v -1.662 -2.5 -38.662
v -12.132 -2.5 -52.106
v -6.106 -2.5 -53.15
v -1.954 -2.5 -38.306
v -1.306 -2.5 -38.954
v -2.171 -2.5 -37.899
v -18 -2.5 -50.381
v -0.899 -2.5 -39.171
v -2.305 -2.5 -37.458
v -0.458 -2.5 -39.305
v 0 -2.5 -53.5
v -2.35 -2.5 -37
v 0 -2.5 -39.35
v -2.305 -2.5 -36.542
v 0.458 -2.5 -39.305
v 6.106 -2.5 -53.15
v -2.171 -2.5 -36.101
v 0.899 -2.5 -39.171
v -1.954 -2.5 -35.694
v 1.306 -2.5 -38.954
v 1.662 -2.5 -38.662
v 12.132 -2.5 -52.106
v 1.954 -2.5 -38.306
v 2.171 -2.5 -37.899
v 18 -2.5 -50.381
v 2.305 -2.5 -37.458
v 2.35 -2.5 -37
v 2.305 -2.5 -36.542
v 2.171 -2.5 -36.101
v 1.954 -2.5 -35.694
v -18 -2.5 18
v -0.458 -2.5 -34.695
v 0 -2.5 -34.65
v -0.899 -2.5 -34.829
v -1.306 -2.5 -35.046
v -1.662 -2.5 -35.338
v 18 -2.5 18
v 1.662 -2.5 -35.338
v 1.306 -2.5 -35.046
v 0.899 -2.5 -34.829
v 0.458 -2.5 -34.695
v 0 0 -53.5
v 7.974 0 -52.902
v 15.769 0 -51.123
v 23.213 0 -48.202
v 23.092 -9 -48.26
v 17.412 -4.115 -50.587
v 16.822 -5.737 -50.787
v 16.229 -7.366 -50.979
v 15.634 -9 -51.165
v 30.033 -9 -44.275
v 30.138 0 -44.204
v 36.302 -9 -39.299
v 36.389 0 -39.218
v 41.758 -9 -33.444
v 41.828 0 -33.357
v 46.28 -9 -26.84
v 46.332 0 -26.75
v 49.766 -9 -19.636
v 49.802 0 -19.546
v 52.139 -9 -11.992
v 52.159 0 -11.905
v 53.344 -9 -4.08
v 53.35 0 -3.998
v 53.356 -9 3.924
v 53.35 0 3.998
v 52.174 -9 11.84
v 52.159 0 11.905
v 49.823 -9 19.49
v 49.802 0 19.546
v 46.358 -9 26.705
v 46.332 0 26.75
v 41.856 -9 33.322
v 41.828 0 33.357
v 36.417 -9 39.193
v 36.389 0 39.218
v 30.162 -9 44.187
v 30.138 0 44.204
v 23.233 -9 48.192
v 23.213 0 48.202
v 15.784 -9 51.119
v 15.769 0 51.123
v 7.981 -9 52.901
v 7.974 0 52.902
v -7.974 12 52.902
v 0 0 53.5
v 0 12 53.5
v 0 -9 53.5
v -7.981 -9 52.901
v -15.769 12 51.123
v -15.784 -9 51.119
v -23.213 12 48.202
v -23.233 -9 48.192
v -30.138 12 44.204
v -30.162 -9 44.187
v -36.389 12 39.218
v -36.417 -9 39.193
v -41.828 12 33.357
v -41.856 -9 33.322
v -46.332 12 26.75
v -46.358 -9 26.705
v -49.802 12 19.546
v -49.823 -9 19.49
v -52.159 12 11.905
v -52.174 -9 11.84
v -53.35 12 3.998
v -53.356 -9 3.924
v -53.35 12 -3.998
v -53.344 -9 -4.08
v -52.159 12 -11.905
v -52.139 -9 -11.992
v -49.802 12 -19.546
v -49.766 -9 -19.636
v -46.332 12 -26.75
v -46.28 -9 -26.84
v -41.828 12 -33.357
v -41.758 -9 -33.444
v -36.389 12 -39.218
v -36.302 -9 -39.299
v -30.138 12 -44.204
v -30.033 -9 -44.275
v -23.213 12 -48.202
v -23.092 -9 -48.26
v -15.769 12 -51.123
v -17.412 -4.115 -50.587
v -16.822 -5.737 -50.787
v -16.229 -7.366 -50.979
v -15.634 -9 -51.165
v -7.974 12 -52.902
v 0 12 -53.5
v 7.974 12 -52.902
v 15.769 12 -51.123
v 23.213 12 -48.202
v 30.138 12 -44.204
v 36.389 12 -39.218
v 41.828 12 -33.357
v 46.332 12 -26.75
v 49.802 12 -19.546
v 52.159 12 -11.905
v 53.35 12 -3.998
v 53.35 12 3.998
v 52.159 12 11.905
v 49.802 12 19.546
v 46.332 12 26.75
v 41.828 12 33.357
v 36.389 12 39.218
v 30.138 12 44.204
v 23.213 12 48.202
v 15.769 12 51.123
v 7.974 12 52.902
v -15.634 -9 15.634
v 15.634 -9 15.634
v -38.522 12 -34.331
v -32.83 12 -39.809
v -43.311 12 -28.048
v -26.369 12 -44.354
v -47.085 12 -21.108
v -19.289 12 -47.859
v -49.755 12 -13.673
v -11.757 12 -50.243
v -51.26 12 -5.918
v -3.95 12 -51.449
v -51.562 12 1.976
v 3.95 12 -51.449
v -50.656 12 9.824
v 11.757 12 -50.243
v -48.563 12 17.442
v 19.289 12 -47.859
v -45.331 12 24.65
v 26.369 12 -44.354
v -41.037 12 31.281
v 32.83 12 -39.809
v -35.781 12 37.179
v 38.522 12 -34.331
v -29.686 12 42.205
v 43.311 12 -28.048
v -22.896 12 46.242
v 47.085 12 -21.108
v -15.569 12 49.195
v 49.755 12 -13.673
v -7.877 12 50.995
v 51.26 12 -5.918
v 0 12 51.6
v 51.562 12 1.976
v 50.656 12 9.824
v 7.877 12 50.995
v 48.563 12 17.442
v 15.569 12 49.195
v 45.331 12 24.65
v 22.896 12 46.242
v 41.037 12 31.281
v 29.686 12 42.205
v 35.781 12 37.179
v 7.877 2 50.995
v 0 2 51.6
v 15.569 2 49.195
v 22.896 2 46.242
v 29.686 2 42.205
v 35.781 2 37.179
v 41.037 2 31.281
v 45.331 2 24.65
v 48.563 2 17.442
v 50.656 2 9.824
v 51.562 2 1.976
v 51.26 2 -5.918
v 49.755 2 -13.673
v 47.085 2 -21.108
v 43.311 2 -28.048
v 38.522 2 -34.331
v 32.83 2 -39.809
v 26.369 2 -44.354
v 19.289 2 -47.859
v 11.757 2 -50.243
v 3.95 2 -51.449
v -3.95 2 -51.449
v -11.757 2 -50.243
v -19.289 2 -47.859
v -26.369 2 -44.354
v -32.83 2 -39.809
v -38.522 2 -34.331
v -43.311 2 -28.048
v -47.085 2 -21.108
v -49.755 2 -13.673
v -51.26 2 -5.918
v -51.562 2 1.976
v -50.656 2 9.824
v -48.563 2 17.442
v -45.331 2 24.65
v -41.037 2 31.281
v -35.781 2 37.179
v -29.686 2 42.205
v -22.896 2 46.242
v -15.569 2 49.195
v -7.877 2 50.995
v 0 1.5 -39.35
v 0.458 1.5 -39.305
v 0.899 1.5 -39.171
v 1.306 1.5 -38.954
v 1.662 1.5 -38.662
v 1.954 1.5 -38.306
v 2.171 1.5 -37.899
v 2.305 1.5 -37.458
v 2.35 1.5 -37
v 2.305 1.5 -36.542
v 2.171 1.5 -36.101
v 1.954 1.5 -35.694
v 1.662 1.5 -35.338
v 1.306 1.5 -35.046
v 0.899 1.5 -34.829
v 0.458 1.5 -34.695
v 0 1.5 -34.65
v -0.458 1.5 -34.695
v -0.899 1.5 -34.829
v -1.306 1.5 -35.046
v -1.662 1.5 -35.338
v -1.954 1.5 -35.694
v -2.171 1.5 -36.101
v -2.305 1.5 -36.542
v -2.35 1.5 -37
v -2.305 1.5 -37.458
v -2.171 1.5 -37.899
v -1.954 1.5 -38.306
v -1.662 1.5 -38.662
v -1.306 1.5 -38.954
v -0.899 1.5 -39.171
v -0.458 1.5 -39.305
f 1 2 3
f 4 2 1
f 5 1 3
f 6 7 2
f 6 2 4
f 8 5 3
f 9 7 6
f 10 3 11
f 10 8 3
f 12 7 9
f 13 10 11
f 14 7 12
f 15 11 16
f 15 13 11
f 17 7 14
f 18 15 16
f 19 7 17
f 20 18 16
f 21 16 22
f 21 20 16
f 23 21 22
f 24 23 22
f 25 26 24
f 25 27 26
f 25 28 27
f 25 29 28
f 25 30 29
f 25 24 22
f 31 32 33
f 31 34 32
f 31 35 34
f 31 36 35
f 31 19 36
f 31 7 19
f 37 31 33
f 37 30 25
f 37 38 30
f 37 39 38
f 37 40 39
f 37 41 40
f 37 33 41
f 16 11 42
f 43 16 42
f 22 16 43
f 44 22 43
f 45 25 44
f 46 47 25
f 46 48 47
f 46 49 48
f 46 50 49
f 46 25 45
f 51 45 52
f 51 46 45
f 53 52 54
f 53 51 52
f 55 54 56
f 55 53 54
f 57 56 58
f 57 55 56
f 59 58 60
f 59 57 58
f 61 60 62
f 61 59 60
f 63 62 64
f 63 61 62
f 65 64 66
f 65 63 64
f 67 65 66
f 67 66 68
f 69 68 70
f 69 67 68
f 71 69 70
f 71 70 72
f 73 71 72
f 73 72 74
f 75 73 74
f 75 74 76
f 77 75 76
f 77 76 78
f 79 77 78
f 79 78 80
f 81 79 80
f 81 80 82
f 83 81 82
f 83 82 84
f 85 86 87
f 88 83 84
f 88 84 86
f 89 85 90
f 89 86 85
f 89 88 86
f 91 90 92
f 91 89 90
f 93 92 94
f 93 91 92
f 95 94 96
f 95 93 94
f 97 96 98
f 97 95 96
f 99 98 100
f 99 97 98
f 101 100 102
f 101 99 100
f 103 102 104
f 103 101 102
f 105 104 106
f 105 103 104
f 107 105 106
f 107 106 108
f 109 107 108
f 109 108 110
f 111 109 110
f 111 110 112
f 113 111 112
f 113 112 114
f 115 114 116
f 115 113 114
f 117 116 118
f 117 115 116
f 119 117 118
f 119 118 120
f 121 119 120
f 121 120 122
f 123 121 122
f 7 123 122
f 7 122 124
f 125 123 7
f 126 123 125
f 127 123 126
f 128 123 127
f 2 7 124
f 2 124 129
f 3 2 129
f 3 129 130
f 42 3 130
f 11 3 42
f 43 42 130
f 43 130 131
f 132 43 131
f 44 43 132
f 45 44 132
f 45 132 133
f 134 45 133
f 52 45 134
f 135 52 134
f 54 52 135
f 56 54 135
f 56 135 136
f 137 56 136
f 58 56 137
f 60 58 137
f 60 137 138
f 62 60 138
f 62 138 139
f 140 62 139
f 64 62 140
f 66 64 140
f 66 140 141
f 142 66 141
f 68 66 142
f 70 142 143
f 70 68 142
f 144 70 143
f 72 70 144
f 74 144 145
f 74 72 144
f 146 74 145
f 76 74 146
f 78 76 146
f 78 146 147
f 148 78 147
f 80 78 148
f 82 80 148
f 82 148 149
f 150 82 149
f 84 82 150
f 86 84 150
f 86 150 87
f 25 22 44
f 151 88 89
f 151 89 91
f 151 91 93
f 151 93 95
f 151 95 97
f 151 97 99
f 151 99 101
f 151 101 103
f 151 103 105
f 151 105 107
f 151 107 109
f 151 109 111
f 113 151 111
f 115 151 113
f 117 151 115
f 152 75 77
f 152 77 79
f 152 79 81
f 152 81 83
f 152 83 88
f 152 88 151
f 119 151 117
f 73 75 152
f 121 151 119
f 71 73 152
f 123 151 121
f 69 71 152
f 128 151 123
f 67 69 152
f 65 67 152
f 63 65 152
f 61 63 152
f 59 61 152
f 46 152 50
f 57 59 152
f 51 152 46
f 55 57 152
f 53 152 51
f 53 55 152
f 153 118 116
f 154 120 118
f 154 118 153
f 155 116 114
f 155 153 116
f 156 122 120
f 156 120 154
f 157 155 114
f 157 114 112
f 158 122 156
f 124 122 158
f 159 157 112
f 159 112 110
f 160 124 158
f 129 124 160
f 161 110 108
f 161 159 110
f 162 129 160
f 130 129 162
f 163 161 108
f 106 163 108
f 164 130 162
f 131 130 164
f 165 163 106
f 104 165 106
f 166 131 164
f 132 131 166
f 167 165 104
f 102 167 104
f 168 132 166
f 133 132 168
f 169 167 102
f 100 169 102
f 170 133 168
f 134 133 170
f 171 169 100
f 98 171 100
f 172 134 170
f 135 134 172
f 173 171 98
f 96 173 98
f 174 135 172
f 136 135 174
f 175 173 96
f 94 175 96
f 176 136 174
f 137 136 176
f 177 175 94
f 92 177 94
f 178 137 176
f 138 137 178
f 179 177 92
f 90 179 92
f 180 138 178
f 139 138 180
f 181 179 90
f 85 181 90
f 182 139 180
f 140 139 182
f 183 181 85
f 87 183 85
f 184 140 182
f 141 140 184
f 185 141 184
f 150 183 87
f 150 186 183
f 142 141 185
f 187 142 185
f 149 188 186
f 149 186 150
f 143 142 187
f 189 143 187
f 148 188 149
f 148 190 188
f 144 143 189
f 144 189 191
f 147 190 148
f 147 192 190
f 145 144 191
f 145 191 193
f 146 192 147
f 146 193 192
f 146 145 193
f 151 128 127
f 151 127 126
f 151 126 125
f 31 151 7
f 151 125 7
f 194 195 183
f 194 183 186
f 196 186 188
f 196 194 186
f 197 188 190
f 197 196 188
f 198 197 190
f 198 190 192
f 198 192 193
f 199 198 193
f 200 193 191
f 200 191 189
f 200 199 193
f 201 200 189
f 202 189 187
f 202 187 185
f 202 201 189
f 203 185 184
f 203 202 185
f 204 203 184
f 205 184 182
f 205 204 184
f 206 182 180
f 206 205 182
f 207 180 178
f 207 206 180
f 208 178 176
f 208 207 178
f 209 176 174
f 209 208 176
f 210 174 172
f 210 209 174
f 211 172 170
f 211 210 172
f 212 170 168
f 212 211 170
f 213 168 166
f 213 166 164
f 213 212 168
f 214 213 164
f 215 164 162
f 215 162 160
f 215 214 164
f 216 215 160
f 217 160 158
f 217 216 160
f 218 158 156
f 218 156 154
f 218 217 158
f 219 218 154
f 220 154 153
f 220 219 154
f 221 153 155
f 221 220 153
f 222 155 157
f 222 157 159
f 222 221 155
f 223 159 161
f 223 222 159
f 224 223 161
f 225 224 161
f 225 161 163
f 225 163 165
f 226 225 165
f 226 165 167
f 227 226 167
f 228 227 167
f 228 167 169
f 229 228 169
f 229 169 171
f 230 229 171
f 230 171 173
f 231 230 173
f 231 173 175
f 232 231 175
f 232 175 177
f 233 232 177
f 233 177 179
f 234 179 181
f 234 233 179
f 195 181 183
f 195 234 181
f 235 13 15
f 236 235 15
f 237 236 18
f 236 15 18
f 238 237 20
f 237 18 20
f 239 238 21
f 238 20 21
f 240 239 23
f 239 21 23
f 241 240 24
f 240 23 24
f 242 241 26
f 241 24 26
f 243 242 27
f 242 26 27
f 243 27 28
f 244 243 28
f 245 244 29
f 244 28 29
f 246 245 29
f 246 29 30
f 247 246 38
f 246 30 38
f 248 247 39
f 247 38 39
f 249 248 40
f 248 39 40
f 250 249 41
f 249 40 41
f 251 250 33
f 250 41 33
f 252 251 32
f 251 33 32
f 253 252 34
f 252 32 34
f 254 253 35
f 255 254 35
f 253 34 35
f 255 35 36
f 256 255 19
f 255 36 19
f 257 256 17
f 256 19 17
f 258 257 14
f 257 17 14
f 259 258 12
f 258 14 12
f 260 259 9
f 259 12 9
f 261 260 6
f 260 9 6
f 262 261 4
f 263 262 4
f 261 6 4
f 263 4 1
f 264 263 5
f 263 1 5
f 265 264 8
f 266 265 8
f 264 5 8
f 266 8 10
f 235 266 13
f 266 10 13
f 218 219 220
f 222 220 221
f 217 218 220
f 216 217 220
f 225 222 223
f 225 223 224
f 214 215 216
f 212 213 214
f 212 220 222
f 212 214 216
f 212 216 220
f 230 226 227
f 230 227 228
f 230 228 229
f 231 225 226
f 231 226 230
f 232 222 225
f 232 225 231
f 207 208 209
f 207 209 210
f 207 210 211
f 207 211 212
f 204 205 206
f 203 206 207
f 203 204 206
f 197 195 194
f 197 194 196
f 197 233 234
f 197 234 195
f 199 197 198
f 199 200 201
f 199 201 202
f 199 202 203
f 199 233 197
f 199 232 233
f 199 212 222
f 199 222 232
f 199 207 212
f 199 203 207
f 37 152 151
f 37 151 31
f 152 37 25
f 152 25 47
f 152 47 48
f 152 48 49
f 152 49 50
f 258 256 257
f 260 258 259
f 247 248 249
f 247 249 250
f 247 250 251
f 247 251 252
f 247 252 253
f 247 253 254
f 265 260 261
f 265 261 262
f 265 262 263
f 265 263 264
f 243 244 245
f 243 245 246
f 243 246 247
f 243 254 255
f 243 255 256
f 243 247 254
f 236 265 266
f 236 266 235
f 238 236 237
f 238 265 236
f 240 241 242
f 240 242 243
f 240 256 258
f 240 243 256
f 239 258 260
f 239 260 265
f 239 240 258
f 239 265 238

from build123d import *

# Parameters (mm, degrees)
SKETCH1_R           = 53.5
BOSS_EXTRUDE1_DEPTH = 2
SKETCH2_R           = 53.5
SKETCH2_R_2         = 51.6
BOSS_EXTRUDE2_DEPTH = 10
BOSS_EXTRUDE3_START = 9
SKETCH4_R           = 53.5
BOSS_EXTRUDE3_DEPTH = 9
SKETCH6_W           = 36
SKETCH6_H           = 36
CUT_EXTRUDE1_DEPTH  = 6.5
DRAFT4_START        = -19
DRAFT4_DEPTH        = 37
DRAFT4_2_DEPTH      = 38
CUT_EXTRUDE2_DEPTH  = 40.5
SKETCH14_R          = 2.35
CUT_EXTRUDE3_DEPTH  = 4


with BuildPart() as part:
    # Sketch1 → Boss-Extrude1 (new body)
    with BuildSketch(Plane(origin=(0, 0, 0), x_dir=(1, 0, 0), z_dir=(0, 1, 0))):
        with Locations(Location((0, 0, 0), (0, 0, 270))):
            Circle(SKETCH1_R)
    extrude(amount=BOSS_EXTRUDE1_DEPTH)

    # Sketch2 → Boss-Extrude2 (add)
    with BuildSketch(Plane(origin=(0, 2, 0), x_dir=(1, 0, 0), z_dir=(0, 1, 0))):
        with Locations(Location((0, 0, 0), (0, 0, 270))):
            Circle(SKETCH2_R)
        with Locations(Location((0, 0, 0), (0, 0, 270))):
            Circle(SKETCH2_R_2, mode=Mode.SUBTRACT)
    extrude(amount=BOSS_EXTRUDE2_DEPTH)

    # Sketch4 → Boss-Extrude3 (add)
    with BuildSketch(Plane.XZ.offset(BOSS_EXTRUDE3_START)):
        with Locations(Location((0, 0, 0), (0, 0, 270))):
            Circle(SKETCH4_R)
    extrude(amount=-BOSS_EXTRUDE3_DEPTH)

    # Sketch6 → Cut-Extrude1 (cut)
    with BuildSketch(Plane.XZ.offset(9)):
        Rectangle(SKETCH6_W, SKETCH6_H)
    extrude(amount=-CUT_EXTRUDE1_DEPTH, mode=Mode.SUBTRACT)

    # Draft4: read off the stored shape, not the designer's step
    # Draft4 outline → Draft4 (add)
    with BuildSketch(Plane.XY.offset(DRAFT4_START)):
        Polygon((18, -9), (18, -2.5), (15.634193477, -9), align=None)
        Polygon((-18, -9), (-15.634193477, -9), (-18, -2.5), align=None)
    extrude(amount=DRAFT4_DEPTH)

    # Draft4 2 outline → Draft4 2 (add)
    with BuildSketch(Plane.YZ.offset(DRAFT4_START)):
        Polygon((-9, 18), (-9, 15.634193477), (-2.5, 18), align=None)
    extrude(amount=DRAFT4_2_DEPTH)

    # Sketch13 → Cut-Extrude2 (cut)
    with BuildSketch(Plane.XY.offset(-18)):
        Polygon((15.634193477, -9), (-15.634193477, -9), (-18, -2.5), (18, -2.5), align=None)
    extrude(amount=-CUT_EXTRUDE2_DEPTH, mode=Mode.SUBTRACT)

    # Sketch14 → Cut-Extrude3 (cut)
    with BuildSketch(Plane.XZ.offset(2.5)):
        with Locations(Location((0, -37, 0), (0, 0, 270))):
            Circle(SKETCH14_R)
    extrude(amount=-CUT_EXTRUDE3_DEPTH, mode=Mode.SUBTRACT)


solid = part.part
